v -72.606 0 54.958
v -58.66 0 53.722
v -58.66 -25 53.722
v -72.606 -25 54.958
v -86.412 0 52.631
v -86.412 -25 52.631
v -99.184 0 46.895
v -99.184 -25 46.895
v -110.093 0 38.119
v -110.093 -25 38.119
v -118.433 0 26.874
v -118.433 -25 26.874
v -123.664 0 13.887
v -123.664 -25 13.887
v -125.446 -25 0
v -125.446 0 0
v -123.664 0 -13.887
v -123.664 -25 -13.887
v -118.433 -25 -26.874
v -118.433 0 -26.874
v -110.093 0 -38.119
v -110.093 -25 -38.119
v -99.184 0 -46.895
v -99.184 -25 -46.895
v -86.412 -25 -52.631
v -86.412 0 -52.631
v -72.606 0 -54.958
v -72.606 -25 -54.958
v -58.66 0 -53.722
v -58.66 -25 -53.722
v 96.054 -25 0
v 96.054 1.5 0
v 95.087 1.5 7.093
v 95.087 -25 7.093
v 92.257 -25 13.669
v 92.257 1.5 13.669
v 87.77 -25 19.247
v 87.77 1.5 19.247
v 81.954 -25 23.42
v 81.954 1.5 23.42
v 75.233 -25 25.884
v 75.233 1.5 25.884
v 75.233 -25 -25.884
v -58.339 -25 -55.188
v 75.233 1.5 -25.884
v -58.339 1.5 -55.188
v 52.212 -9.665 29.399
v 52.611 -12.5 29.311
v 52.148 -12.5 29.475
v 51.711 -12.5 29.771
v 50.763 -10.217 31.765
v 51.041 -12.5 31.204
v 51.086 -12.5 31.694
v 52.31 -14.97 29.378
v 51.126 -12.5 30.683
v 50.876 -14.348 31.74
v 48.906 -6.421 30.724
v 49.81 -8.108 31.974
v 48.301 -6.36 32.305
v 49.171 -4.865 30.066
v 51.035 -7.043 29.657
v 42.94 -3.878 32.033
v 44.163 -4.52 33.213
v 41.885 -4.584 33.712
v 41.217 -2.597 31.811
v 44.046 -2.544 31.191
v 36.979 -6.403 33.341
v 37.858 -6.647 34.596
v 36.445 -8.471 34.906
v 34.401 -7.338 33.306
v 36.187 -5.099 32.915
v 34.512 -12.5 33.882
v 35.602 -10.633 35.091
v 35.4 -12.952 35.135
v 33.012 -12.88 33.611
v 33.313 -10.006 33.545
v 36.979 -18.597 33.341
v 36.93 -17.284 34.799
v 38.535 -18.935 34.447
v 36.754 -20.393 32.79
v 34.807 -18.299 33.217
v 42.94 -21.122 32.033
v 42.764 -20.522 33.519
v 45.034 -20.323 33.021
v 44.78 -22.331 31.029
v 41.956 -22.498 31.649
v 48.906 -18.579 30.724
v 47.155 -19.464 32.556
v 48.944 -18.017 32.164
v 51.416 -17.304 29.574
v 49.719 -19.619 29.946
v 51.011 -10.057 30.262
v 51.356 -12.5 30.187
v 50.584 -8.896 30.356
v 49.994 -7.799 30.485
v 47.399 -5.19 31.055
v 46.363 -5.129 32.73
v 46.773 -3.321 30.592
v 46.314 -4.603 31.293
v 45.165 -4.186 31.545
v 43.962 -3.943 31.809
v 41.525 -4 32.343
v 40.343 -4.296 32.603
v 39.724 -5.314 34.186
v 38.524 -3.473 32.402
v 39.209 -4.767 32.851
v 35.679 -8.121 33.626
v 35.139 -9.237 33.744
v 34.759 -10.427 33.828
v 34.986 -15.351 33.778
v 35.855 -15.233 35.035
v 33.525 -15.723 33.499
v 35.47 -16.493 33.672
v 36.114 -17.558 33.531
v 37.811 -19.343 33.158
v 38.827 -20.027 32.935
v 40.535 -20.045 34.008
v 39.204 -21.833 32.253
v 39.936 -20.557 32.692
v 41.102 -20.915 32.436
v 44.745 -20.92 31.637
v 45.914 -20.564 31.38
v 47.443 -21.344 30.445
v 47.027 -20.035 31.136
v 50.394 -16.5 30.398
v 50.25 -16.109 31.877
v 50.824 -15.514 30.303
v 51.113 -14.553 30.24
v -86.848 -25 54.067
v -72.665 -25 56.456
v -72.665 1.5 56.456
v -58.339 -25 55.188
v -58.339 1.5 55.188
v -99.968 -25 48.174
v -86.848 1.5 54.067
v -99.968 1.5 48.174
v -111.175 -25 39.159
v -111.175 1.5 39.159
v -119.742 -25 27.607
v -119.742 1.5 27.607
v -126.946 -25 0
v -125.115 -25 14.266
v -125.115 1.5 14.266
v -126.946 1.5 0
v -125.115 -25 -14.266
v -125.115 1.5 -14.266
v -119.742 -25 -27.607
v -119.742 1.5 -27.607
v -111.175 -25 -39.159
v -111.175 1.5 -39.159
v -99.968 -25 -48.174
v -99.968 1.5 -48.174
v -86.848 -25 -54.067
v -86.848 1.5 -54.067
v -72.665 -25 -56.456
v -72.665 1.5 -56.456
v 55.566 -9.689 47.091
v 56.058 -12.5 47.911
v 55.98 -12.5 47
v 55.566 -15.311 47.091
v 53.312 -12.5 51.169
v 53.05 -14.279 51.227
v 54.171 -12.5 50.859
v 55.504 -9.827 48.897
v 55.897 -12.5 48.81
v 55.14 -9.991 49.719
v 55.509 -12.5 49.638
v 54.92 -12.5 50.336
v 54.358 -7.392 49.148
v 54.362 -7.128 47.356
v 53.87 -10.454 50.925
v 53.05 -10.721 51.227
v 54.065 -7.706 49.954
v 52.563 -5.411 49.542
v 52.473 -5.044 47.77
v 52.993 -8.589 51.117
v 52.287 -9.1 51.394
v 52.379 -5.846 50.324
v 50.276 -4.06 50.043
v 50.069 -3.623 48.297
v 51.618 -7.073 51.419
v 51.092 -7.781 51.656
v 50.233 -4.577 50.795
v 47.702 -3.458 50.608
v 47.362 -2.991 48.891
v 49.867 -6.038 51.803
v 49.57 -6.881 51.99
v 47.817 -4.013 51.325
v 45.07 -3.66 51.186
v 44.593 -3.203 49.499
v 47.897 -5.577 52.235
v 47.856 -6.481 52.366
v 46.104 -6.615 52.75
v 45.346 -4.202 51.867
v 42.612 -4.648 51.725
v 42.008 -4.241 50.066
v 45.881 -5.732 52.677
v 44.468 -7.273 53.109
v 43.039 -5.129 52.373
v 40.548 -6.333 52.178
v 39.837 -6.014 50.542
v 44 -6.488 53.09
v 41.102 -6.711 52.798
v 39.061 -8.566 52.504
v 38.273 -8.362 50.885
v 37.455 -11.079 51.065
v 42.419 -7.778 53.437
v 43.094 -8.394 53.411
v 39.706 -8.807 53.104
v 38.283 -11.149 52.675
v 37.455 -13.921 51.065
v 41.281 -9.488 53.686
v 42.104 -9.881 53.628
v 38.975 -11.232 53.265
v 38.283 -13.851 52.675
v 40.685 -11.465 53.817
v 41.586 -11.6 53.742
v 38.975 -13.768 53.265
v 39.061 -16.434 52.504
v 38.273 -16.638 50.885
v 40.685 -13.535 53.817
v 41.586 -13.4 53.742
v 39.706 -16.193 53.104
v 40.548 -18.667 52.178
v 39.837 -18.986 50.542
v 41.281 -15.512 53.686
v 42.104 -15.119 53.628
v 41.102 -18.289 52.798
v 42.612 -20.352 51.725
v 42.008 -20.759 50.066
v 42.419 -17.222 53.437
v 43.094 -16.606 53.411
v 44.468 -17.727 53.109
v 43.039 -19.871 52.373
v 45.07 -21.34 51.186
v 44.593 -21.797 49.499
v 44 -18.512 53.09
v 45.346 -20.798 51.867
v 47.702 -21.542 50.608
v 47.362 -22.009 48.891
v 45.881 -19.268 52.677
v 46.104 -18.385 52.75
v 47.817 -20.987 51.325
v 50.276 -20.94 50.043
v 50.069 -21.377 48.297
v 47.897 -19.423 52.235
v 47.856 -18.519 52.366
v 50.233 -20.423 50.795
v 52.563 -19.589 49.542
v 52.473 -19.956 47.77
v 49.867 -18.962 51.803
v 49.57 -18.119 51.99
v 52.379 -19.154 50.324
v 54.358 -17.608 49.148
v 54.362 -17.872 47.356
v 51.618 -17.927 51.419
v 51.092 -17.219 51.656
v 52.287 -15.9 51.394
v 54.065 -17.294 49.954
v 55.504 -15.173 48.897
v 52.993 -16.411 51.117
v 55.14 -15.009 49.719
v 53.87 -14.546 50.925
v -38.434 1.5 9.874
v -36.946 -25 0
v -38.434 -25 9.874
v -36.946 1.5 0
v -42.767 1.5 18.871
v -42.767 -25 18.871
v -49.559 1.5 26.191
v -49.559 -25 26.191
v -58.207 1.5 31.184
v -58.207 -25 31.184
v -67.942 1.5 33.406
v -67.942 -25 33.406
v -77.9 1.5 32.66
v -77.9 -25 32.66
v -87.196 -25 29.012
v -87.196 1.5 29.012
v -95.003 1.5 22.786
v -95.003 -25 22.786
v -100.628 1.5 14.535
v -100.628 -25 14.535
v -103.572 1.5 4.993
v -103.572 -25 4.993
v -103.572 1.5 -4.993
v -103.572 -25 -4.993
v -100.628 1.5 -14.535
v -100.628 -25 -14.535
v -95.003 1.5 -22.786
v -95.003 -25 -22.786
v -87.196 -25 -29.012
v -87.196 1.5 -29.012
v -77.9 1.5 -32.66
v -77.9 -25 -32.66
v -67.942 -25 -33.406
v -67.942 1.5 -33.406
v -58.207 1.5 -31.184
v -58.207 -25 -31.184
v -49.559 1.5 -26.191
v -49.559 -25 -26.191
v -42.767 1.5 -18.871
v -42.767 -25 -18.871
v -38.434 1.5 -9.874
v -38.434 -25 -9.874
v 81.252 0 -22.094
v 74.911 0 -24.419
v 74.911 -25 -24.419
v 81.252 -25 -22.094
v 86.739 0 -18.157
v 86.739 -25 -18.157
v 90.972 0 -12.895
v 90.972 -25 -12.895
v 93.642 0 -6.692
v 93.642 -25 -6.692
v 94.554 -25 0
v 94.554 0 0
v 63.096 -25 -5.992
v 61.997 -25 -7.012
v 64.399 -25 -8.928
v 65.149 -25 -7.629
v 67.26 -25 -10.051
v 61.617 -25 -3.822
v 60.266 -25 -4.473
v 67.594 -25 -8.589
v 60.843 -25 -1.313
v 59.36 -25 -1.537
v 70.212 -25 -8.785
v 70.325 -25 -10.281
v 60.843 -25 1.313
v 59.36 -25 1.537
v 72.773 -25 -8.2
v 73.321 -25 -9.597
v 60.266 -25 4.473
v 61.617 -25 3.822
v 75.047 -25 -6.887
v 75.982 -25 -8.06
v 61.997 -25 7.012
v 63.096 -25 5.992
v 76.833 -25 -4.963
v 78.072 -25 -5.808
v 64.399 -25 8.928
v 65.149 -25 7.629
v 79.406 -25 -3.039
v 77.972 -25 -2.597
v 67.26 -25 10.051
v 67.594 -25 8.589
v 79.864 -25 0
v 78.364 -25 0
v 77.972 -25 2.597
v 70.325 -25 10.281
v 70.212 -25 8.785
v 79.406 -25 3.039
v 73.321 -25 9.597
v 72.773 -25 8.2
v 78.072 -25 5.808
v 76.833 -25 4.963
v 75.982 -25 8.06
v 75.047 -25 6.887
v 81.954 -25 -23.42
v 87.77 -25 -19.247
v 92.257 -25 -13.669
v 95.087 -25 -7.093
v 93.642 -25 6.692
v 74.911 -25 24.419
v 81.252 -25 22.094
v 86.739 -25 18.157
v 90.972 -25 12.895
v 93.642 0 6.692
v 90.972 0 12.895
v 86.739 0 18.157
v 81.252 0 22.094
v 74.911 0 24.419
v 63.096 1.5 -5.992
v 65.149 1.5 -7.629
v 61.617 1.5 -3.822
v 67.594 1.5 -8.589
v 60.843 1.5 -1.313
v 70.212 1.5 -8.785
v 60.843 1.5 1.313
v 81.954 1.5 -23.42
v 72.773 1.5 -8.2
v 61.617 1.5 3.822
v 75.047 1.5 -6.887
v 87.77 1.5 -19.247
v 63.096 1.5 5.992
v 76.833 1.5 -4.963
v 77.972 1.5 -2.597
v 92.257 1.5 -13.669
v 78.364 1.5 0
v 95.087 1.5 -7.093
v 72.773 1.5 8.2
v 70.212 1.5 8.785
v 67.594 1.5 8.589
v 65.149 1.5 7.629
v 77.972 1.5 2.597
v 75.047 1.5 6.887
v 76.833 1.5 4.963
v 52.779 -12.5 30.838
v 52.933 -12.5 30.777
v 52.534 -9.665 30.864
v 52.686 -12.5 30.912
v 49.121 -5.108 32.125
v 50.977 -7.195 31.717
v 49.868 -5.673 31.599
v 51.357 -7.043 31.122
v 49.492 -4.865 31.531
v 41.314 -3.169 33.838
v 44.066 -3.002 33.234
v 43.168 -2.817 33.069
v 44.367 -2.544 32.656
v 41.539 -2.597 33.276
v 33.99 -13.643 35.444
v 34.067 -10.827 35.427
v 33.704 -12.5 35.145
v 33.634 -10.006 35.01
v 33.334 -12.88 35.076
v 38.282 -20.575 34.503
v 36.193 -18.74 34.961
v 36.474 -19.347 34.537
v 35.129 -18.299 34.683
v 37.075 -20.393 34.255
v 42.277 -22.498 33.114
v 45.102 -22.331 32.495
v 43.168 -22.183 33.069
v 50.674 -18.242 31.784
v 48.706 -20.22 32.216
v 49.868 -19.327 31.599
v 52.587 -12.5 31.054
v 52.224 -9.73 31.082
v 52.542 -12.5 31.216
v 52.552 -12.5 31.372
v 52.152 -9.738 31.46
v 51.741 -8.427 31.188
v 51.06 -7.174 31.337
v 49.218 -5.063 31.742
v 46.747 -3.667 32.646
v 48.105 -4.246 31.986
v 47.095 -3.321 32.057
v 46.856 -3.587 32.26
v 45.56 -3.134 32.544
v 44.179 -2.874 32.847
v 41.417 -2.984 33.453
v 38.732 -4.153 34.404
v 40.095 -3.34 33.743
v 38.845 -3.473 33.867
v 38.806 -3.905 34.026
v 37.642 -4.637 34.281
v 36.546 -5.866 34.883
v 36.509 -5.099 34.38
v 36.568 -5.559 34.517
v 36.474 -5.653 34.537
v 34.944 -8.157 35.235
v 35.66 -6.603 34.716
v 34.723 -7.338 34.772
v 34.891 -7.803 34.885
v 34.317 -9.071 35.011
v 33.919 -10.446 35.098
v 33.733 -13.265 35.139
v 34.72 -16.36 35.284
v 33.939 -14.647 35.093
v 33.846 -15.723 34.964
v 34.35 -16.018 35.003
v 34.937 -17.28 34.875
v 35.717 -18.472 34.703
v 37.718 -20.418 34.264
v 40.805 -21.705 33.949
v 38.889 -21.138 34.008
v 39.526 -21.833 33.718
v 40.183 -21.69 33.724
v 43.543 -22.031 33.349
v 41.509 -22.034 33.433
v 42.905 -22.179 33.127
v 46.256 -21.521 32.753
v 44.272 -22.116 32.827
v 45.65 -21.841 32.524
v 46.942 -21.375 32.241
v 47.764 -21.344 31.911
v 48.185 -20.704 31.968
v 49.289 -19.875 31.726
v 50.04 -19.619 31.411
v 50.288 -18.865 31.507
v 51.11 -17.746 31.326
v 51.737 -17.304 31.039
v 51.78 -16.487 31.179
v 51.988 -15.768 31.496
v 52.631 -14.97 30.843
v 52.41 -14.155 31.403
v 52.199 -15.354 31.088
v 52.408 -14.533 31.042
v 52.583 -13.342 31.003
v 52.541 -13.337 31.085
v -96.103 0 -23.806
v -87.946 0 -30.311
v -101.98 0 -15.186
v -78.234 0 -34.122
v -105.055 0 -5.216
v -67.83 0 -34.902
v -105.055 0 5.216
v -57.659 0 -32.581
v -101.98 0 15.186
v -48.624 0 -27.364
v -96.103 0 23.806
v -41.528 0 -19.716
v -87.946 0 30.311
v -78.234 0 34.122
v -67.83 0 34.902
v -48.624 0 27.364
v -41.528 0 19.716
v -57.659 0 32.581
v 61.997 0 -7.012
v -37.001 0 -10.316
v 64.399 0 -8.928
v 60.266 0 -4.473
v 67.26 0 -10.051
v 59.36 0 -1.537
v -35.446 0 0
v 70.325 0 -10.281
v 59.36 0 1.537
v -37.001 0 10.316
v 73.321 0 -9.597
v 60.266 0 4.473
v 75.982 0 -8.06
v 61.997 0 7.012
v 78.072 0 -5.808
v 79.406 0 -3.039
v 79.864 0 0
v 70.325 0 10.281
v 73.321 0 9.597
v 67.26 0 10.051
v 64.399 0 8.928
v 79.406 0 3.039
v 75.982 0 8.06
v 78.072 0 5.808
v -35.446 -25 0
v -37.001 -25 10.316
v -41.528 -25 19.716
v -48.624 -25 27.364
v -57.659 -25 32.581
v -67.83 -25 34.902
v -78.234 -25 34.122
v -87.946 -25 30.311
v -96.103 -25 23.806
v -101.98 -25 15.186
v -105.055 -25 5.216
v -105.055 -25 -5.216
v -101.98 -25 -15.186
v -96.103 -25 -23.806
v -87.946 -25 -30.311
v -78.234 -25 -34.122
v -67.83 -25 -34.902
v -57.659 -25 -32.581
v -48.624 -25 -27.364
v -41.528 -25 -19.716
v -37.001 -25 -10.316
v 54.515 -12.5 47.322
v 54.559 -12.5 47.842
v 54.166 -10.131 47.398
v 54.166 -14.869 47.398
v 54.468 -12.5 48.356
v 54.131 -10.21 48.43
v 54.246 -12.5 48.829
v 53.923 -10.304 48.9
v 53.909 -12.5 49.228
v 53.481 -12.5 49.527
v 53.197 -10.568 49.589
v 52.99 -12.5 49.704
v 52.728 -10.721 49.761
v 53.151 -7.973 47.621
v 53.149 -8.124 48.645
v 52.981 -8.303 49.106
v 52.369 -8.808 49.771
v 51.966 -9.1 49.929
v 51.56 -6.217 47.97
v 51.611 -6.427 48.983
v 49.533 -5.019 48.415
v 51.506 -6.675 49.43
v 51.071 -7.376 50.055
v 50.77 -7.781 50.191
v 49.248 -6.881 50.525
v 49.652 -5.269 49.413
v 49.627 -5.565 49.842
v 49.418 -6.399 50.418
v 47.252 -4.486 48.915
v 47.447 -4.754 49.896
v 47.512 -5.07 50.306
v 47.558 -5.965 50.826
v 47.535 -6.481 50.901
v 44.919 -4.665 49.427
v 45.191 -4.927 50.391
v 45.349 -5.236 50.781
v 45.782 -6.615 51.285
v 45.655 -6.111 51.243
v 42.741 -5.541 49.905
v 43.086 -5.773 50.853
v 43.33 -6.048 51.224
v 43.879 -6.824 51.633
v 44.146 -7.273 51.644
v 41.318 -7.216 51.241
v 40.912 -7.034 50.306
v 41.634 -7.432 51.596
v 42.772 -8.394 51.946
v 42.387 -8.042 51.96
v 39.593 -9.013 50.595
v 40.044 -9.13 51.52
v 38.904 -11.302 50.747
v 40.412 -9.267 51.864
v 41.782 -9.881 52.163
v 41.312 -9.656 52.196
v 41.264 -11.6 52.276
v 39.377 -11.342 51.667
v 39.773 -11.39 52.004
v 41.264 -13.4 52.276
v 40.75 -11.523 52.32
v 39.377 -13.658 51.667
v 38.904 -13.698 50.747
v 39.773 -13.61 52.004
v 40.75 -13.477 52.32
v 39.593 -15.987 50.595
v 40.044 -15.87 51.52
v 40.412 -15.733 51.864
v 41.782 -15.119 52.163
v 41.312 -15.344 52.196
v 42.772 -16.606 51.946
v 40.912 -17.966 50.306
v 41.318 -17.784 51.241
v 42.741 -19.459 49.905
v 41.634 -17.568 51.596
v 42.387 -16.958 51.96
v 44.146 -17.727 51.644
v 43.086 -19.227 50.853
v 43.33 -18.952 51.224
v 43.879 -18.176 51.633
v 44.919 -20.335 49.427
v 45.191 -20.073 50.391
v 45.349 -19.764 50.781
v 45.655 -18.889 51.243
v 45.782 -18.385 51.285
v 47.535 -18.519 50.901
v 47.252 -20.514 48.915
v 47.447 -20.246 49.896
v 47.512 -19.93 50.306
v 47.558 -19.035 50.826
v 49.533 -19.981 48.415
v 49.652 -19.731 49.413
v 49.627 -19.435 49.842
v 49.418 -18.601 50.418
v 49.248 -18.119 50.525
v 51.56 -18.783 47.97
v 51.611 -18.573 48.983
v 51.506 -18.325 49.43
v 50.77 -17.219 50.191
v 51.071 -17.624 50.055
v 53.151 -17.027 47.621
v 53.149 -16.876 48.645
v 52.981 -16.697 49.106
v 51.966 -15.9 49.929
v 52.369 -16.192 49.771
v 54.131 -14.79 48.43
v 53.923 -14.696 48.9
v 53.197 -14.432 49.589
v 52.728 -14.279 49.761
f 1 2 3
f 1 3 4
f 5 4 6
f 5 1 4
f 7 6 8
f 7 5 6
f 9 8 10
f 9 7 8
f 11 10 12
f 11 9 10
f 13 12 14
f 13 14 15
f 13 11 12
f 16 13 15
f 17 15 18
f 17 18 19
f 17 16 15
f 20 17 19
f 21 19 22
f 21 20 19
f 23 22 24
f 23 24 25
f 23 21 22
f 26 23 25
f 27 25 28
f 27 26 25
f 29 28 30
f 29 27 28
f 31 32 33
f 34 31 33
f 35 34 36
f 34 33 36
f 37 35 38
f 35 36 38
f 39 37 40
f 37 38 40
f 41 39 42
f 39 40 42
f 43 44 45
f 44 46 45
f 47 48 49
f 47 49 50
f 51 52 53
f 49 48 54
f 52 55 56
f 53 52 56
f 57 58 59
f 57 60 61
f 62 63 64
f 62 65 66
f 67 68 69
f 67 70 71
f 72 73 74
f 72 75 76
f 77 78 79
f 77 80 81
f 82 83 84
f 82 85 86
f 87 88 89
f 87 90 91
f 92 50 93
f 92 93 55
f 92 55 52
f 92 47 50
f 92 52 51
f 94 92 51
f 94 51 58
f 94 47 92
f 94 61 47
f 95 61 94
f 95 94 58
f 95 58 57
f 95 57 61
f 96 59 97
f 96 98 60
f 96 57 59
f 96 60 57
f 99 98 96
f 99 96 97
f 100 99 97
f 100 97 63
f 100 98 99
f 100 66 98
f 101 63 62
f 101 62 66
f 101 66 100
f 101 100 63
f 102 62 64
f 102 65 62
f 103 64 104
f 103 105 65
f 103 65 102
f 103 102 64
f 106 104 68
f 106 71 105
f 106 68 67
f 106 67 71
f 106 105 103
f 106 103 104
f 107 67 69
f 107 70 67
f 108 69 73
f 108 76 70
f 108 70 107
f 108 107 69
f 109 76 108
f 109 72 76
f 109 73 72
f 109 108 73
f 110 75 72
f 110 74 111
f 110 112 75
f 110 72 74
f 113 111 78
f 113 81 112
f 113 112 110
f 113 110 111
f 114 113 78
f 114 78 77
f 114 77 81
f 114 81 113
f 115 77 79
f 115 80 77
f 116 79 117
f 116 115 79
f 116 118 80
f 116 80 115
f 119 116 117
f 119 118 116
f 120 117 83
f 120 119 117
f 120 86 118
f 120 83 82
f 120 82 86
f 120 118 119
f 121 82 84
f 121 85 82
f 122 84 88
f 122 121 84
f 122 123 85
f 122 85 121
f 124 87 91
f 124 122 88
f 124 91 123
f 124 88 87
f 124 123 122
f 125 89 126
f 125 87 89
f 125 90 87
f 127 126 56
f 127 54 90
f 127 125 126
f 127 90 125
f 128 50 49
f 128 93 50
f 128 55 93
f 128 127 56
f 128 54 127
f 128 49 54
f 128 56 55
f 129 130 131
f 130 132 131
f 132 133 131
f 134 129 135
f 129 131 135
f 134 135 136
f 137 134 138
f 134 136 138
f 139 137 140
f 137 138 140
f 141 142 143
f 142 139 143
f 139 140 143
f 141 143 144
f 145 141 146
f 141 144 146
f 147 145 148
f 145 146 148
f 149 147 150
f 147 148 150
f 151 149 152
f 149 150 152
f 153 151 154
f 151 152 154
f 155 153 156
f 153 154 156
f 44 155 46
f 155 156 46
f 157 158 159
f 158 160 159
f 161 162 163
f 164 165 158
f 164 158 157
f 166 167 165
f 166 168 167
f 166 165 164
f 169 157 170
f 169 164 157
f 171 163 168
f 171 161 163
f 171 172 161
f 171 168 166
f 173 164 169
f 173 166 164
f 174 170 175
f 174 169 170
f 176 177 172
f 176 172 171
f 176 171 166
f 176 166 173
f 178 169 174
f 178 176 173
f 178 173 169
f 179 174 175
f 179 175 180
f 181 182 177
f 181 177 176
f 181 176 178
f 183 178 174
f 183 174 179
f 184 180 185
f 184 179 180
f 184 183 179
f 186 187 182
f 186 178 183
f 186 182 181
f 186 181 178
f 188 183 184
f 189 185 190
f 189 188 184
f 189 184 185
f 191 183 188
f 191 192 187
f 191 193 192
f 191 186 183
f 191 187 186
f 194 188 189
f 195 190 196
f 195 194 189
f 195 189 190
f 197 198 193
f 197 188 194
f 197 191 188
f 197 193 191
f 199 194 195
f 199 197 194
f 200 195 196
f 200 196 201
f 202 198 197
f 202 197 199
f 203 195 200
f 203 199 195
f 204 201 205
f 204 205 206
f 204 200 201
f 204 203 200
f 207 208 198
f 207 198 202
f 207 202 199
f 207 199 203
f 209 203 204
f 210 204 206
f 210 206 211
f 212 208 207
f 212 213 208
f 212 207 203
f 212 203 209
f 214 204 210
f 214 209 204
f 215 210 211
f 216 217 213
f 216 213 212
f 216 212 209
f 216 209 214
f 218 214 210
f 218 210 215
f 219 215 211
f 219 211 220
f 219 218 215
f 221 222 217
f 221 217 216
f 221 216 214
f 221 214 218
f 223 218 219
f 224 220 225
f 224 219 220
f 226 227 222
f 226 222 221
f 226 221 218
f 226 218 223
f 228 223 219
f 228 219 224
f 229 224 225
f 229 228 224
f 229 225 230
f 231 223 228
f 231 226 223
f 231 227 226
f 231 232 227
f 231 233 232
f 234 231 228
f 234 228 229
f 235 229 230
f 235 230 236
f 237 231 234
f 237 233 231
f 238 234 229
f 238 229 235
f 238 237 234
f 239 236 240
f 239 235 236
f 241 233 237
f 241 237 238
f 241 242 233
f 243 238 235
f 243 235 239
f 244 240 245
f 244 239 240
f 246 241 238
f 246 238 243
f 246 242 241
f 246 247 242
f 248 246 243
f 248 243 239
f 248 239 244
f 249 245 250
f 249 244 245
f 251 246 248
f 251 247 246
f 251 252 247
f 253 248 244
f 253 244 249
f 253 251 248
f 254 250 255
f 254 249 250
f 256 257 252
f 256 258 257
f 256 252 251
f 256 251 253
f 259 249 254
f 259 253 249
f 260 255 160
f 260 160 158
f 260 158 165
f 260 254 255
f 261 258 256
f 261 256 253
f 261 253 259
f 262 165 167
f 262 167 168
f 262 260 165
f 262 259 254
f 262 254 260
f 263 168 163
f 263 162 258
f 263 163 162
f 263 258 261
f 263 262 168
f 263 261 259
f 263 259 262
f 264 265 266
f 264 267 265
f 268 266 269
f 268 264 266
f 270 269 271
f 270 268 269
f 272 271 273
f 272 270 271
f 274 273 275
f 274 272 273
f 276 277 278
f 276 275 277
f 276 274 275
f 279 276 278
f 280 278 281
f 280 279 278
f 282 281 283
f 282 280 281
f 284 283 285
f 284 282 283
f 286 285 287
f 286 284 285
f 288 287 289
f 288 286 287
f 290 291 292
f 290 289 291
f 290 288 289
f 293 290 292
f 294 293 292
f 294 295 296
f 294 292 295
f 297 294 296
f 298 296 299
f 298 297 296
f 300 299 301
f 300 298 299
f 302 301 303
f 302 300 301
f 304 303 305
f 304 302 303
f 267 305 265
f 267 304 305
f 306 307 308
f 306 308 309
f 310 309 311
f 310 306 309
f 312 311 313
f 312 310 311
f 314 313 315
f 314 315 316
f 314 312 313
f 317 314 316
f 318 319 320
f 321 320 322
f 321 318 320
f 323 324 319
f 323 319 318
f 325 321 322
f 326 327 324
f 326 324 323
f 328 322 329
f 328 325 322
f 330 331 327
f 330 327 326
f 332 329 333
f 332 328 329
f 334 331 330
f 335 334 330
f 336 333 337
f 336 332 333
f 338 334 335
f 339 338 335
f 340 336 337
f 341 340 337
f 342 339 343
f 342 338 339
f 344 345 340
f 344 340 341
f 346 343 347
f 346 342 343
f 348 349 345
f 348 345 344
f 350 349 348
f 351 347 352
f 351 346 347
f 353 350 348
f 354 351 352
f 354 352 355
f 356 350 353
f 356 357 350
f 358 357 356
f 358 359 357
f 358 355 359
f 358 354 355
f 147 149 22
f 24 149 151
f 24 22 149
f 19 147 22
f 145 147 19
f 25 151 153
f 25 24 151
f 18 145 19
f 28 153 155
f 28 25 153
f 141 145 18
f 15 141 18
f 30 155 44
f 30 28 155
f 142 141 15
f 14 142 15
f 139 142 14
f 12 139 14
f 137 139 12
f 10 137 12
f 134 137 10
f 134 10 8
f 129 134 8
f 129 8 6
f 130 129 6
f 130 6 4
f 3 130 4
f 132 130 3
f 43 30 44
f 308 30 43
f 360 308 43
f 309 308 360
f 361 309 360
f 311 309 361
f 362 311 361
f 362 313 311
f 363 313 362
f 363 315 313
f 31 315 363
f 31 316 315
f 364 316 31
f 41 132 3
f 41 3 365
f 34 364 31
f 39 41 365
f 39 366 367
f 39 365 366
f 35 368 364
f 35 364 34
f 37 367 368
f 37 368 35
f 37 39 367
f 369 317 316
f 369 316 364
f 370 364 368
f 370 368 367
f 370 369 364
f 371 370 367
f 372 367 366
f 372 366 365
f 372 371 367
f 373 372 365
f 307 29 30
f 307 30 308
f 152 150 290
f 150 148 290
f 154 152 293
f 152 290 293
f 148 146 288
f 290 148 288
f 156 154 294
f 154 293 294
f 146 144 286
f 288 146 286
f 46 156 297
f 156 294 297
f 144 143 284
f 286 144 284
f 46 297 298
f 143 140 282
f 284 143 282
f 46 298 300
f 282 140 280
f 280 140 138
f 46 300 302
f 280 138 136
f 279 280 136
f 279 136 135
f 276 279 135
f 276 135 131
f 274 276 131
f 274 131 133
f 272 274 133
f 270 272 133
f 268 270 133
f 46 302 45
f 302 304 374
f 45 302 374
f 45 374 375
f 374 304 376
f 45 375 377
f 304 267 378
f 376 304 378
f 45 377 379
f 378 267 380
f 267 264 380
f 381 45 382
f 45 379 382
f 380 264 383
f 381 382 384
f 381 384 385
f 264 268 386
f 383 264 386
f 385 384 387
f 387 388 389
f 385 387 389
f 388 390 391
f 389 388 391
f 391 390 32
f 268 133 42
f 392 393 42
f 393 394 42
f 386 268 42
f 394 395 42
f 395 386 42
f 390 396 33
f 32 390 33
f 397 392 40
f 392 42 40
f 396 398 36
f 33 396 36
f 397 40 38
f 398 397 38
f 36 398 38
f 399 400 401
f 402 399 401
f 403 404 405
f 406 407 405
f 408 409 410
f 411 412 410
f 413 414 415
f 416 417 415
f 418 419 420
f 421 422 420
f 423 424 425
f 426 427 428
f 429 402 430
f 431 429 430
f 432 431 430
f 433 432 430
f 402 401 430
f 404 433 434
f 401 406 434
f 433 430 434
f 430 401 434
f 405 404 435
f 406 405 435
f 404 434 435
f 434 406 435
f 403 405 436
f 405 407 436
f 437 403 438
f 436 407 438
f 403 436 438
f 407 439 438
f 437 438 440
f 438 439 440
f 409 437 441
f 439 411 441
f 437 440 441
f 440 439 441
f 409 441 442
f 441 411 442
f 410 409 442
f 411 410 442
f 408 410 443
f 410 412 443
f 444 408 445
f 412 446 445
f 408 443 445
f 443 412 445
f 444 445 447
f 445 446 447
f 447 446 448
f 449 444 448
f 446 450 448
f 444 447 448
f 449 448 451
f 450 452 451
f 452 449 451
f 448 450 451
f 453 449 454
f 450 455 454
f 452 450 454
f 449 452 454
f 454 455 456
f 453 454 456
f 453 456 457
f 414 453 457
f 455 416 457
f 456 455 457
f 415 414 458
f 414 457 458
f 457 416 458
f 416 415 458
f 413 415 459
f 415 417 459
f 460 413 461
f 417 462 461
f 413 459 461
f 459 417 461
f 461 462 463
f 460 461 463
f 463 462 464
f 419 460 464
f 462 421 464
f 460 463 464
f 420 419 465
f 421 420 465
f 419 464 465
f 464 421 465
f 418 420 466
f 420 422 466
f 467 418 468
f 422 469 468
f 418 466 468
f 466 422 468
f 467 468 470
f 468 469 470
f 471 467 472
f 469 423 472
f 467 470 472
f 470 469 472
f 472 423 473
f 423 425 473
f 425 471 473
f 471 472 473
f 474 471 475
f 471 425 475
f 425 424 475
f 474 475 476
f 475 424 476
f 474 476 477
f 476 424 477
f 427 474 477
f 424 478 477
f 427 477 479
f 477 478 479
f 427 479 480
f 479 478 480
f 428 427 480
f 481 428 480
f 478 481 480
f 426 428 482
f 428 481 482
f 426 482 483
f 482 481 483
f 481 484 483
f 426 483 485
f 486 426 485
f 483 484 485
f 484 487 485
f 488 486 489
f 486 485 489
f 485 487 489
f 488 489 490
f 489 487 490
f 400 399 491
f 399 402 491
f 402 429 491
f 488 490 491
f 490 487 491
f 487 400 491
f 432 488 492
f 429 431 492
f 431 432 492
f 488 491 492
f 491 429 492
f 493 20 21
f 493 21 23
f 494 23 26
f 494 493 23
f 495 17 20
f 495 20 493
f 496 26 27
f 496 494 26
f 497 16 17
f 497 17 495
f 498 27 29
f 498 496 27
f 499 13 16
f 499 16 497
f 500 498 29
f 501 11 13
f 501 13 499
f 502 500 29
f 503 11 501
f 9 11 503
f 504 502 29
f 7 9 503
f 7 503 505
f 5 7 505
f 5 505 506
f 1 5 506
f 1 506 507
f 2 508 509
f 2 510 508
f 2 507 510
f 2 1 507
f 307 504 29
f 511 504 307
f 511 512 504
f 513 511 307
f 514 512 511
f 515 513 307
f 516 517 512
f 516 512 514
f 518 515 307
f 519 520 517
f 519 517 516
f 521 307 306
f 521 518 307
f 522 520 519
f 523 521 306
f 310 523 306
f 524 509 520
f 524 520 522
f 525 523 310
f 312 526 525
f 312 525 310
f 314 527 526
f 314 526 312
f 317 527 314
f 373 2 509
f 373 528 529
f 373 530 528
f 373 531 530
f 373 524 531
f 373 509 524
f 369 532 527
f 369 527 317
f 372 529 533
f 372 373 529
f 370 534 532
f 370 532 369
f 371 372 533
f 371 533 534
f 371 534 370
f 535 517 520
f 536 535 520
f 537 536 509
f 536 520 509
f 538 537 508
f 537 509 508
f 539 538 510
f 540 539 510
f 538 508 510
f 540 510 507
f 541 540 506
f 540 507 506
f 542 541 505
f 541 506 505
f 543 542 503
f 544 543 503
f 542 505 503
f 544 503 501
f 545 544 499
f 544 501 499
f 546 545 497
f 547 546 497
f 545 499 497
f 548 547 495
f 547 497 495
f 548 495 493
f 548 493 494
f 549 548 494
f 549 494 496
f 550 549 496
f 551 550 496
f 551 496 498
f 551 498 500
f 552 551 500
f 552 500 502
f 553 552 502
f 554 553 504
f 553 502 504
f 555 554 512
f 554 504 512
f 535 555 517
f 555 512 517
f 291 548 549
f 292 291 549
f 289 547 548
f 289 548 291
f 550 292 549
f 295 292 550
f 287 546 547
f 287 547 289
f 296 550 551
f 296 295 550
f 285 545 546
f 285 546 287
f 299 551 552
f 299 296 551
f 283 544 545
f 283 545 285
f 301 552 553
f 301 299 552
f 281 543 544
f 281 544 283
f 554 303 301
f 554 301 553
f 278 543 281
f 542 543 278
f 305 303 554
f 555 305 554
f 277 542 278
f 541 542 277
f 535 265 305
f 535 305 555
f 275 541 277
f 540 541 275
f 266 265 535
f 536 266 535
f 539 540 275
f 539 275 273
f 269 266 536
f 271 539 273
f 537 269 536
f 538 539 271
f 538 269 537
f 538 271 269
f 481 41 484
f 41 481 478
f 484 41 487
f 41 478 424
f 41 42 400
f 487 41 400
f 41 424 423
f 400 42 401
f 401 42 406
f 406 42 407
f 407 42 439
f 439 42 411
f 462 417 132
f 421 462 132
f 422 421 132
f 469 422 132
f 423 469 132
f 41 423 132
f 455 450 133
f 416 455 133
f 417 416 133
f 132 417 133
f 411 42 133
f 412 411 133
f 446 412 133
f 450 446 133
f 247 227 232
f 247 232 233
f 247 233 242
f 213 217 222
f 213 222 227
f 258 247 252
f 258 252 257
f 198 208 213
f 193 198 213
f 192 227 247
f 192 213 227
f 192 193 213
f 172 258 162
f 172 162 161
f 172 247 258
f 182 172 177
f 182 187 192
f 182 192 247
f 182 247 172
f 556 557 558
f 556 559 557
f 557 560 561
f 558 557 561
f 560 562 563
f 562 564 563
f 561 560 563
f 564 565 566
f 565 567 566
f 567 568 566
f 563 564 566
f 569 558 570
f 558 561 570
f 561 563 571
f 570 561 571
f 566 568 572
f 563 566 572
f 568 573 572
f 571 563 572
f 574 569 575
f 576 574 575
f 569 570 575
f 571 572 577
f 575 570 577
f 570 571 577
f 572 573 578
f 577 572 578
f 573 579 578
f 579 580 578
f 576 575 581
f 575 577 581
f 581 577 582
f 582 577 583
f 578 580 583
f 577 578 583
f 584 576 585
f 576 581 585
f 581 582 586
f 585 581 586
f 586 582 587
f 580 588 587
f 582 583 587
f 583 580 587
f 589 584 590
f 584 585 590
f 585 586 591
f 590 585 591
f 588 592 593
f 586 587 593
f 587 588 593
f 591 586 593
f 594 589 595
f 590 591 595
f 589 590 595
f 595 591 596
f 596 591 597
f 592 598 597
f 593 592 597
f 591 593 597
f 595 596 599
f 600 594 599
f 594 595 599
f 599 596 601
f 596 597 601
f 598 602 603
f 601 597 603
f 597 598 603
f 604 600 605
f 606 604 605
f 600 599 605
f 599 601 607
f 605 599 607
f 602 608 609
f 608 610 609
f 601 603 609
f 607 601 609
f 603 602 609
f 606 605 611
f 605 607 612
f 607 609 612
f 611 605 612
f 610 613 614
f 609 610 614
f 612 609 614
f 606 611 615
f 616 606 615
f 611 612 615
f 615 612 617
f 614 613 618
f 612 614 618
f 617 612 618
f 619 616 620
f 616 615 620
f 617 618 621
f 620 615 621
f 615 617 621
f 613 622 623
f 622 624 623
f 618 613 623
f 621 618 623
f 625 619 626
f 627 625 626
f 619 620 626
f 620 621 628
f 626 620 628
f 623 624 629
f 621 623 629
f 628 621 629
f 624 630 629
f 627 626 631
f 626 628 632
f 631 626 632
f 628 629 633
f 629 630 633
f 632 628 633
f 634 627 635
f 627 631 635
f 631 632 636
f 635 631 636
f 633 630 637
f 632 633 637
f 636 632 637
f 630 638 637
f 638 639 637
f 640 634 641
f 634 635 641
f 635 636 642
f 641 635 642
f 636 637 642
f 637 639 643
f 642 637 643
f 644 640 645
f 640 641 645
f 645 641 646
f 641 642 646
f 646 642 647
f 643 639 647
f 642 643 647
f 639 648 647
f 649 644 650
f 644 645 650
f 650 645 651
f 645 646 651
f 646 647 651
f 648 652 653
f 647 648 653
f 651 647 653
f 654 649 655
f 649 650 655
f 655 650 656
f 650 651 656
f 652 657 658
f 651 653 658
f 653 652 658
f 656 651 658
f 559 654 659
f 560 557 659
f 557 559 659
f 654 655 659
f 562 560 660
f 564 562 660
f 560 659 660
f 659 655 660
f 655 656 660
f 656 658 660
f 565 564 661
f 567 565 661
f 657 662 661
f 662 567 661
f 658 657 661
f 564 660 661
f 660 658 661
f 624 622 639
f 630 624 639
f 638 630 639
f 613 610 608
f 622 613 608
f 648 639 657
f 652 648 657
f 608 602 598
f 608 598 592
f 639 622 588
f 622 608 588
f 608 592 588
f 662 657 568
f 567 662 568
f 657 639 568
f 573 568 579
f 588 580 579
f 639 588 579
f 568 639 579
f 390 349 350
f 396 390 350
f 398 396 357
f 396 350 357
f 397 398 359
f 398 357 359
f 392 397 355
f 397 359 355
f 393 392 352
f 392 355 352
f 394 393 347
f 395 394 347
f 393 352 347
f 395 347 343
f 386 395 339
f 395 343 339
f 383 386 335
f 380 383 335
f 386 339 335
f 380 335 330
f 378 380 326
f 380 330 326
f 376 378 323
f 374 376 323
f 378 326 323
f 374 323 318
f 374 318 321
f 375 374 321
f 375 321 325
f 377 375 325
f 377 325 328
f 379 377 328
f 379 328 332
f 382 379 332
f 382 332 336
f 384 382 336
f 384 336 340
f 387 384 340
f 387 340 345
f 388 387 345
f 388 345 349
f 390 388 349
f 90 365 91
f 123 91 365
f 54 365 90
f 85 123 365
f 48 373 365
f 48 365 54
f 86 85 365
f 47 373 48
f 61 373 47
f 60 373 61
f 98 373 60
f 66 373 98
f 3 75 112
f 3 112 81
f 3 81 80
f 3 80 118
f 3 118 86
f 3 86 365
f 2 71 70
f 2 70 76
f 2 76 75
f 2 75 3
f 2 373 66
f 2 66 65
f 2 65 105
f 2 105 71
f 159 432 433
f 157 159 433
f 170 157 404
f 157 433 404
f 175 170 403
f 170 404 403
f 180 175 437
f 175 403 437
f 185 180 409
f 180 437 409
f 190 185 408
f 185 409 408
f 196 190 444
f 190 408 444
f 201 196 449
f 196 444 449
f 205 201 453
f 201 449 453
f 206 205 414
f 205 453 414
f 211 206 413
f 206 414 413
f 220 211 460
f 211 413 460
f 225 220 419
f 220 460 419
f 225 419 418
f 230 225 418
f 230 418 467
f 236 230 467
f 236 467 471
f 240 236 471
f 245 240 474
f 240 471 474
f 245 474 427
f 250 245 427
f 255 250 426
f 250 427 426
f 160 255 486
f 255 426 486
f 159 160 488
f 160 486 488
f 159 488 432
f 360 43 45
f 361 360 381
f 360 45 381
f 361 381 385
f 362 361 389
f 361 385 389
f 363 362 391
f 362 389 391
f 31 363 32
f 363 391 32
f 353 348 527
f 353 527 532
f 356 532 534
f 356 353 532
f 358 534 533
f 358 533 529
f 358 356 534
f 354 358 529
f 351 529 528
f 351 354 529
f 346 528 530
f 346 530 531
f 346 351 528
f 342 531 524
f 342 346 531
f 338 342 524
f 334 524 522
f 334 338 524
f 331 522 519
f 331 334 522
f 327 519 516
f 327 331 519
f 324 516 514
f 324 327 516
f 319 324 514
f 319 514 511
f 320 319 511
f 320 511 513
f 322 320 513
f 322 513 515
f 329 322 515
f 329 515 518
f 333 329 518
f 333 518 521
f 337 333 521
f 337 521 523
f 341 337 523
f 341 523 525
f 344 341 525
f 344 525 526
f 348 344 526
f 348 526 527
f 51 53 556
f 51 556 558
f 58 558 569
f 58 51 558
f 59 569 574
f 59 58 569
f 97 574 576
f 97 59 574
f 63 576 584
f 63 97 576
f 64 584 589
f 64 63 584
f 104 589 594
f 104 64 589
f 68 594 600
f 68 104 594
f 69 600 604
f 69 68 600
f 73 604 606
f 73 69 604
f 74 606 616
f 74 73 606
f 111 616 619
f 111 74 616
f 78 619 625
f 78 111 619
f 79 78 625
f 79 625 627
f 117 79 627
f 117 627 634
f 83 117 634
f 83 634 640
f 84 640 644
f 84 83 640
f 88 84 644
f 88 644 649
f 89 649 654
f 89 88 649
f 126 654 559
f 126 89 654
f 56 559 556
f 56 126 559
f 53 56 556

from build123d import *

# Parameters (mm, degrees)
F0_R     = 35
F1_DEPTH = 25
F2_R     = 8.0361334601
F3_DEPTH = 20
F4_R     = 2
F5_R     = 10.3094421679
F6_DEPTH = 25.001
F7_T     = 1.5


with BuildPart() as f1:
    # F0 (on Front) → F1 (new body)
    with BuildSketch(Plane.XZ):
        with BuildLine():
            ThreePointArc((-58.6601695194, -53.7224063011), (-27.590229069, -34.473074379), (-15.4458838051, 0))
            ThreePointArc((-15.4458838051, 0), (-27.590229069, 34.473074379), (-58.6601695194, 53.7224063011))
            ThreePointArc((-58.6601695194, 53.7224063011), (-125.4458838051, 0), (-58.6601695194, -53.7224063011))
        make_face()
        with Locations((-70.4458838051, 0)):
            Circle(F0_R, mode=Mode.SUBTRACT)
        with BuildLine():
            ThreePointArc((-58.6601695194, 53.7224063011), (-27.590229069, 34.473074379), (-15.4458838051, 0))
            ThreePointArc((-15.4458838051, 0), (-27.590229069, -34.473074379), (-58.6601695194, -53.7224063011))
            Line((-58.6601695194, -53.7224063011), (74.9112590521, -24.4192755914))
            ThreePointArc((74.9112590521, -24.4192755914), (44.5541161949, 0), (74.9112590521, 24.4192755914))
            Line((74.9112590521, 24.4192755914), (-58.6601695194, 53.7224063011))
        make_face()
        with BuildLine():
            ThreePointArc((94.5541161949, 0), (89.0339592568, 15.6695792632), (74.9112590521, 24.4192755914))
            ThreePointArc((74.9112590521, 24.4192755914), (44.5541161949, 0), (74.9112590521, -24.4192755914))
            ThreePointArc((74.9112590521, -24.4192755914), (89.0339592568, -15.6695792632), (94.5541161949, 0))
        make_face()
    extrude(amount=F1_DEPTH)

    # F2 (on face) → F3 (join)
    with BuildSketch(Plane(origin=(8.5509543151, 0, 38.9775138646), x_dir=(0.9767710237, 0, -0.2142857143), z_dir=(0.2142857143, 0, 0.9767710237))):
        with Locations((35.0721742403, -12.5)):
            Circle(F2_R)
    extrude(amount=F3_DEPTH)

    # F4
    f4_edges = [f1.edges().sort_by_distance(p)[0] for p in [
        (39.24469, -12.5, 52.719497),
        (34.958976, -12.5, 33.184077),
    ]]
    fillet(f4_edges, radius=F4_R)

    # F5 (on face) → F6 (cut, through all)
    with BuildSketch(Plane.XZ.offset(25)):
        with Locations((69.5541161949, 0)):
            Circle(F5_R)
    extrude(amount=-F6_DEPTH, mode=Mode.SUBTRACT)

    # F7
    f7_openings = [f1.faces().sort_by_distance(p)[0] for p in [
        (-17.192474, -25, 0),
    ]]
    offset(amount=F7_T, openings=f7_openings, kind=Kind.INTERSECTION)


solid = f1.part
